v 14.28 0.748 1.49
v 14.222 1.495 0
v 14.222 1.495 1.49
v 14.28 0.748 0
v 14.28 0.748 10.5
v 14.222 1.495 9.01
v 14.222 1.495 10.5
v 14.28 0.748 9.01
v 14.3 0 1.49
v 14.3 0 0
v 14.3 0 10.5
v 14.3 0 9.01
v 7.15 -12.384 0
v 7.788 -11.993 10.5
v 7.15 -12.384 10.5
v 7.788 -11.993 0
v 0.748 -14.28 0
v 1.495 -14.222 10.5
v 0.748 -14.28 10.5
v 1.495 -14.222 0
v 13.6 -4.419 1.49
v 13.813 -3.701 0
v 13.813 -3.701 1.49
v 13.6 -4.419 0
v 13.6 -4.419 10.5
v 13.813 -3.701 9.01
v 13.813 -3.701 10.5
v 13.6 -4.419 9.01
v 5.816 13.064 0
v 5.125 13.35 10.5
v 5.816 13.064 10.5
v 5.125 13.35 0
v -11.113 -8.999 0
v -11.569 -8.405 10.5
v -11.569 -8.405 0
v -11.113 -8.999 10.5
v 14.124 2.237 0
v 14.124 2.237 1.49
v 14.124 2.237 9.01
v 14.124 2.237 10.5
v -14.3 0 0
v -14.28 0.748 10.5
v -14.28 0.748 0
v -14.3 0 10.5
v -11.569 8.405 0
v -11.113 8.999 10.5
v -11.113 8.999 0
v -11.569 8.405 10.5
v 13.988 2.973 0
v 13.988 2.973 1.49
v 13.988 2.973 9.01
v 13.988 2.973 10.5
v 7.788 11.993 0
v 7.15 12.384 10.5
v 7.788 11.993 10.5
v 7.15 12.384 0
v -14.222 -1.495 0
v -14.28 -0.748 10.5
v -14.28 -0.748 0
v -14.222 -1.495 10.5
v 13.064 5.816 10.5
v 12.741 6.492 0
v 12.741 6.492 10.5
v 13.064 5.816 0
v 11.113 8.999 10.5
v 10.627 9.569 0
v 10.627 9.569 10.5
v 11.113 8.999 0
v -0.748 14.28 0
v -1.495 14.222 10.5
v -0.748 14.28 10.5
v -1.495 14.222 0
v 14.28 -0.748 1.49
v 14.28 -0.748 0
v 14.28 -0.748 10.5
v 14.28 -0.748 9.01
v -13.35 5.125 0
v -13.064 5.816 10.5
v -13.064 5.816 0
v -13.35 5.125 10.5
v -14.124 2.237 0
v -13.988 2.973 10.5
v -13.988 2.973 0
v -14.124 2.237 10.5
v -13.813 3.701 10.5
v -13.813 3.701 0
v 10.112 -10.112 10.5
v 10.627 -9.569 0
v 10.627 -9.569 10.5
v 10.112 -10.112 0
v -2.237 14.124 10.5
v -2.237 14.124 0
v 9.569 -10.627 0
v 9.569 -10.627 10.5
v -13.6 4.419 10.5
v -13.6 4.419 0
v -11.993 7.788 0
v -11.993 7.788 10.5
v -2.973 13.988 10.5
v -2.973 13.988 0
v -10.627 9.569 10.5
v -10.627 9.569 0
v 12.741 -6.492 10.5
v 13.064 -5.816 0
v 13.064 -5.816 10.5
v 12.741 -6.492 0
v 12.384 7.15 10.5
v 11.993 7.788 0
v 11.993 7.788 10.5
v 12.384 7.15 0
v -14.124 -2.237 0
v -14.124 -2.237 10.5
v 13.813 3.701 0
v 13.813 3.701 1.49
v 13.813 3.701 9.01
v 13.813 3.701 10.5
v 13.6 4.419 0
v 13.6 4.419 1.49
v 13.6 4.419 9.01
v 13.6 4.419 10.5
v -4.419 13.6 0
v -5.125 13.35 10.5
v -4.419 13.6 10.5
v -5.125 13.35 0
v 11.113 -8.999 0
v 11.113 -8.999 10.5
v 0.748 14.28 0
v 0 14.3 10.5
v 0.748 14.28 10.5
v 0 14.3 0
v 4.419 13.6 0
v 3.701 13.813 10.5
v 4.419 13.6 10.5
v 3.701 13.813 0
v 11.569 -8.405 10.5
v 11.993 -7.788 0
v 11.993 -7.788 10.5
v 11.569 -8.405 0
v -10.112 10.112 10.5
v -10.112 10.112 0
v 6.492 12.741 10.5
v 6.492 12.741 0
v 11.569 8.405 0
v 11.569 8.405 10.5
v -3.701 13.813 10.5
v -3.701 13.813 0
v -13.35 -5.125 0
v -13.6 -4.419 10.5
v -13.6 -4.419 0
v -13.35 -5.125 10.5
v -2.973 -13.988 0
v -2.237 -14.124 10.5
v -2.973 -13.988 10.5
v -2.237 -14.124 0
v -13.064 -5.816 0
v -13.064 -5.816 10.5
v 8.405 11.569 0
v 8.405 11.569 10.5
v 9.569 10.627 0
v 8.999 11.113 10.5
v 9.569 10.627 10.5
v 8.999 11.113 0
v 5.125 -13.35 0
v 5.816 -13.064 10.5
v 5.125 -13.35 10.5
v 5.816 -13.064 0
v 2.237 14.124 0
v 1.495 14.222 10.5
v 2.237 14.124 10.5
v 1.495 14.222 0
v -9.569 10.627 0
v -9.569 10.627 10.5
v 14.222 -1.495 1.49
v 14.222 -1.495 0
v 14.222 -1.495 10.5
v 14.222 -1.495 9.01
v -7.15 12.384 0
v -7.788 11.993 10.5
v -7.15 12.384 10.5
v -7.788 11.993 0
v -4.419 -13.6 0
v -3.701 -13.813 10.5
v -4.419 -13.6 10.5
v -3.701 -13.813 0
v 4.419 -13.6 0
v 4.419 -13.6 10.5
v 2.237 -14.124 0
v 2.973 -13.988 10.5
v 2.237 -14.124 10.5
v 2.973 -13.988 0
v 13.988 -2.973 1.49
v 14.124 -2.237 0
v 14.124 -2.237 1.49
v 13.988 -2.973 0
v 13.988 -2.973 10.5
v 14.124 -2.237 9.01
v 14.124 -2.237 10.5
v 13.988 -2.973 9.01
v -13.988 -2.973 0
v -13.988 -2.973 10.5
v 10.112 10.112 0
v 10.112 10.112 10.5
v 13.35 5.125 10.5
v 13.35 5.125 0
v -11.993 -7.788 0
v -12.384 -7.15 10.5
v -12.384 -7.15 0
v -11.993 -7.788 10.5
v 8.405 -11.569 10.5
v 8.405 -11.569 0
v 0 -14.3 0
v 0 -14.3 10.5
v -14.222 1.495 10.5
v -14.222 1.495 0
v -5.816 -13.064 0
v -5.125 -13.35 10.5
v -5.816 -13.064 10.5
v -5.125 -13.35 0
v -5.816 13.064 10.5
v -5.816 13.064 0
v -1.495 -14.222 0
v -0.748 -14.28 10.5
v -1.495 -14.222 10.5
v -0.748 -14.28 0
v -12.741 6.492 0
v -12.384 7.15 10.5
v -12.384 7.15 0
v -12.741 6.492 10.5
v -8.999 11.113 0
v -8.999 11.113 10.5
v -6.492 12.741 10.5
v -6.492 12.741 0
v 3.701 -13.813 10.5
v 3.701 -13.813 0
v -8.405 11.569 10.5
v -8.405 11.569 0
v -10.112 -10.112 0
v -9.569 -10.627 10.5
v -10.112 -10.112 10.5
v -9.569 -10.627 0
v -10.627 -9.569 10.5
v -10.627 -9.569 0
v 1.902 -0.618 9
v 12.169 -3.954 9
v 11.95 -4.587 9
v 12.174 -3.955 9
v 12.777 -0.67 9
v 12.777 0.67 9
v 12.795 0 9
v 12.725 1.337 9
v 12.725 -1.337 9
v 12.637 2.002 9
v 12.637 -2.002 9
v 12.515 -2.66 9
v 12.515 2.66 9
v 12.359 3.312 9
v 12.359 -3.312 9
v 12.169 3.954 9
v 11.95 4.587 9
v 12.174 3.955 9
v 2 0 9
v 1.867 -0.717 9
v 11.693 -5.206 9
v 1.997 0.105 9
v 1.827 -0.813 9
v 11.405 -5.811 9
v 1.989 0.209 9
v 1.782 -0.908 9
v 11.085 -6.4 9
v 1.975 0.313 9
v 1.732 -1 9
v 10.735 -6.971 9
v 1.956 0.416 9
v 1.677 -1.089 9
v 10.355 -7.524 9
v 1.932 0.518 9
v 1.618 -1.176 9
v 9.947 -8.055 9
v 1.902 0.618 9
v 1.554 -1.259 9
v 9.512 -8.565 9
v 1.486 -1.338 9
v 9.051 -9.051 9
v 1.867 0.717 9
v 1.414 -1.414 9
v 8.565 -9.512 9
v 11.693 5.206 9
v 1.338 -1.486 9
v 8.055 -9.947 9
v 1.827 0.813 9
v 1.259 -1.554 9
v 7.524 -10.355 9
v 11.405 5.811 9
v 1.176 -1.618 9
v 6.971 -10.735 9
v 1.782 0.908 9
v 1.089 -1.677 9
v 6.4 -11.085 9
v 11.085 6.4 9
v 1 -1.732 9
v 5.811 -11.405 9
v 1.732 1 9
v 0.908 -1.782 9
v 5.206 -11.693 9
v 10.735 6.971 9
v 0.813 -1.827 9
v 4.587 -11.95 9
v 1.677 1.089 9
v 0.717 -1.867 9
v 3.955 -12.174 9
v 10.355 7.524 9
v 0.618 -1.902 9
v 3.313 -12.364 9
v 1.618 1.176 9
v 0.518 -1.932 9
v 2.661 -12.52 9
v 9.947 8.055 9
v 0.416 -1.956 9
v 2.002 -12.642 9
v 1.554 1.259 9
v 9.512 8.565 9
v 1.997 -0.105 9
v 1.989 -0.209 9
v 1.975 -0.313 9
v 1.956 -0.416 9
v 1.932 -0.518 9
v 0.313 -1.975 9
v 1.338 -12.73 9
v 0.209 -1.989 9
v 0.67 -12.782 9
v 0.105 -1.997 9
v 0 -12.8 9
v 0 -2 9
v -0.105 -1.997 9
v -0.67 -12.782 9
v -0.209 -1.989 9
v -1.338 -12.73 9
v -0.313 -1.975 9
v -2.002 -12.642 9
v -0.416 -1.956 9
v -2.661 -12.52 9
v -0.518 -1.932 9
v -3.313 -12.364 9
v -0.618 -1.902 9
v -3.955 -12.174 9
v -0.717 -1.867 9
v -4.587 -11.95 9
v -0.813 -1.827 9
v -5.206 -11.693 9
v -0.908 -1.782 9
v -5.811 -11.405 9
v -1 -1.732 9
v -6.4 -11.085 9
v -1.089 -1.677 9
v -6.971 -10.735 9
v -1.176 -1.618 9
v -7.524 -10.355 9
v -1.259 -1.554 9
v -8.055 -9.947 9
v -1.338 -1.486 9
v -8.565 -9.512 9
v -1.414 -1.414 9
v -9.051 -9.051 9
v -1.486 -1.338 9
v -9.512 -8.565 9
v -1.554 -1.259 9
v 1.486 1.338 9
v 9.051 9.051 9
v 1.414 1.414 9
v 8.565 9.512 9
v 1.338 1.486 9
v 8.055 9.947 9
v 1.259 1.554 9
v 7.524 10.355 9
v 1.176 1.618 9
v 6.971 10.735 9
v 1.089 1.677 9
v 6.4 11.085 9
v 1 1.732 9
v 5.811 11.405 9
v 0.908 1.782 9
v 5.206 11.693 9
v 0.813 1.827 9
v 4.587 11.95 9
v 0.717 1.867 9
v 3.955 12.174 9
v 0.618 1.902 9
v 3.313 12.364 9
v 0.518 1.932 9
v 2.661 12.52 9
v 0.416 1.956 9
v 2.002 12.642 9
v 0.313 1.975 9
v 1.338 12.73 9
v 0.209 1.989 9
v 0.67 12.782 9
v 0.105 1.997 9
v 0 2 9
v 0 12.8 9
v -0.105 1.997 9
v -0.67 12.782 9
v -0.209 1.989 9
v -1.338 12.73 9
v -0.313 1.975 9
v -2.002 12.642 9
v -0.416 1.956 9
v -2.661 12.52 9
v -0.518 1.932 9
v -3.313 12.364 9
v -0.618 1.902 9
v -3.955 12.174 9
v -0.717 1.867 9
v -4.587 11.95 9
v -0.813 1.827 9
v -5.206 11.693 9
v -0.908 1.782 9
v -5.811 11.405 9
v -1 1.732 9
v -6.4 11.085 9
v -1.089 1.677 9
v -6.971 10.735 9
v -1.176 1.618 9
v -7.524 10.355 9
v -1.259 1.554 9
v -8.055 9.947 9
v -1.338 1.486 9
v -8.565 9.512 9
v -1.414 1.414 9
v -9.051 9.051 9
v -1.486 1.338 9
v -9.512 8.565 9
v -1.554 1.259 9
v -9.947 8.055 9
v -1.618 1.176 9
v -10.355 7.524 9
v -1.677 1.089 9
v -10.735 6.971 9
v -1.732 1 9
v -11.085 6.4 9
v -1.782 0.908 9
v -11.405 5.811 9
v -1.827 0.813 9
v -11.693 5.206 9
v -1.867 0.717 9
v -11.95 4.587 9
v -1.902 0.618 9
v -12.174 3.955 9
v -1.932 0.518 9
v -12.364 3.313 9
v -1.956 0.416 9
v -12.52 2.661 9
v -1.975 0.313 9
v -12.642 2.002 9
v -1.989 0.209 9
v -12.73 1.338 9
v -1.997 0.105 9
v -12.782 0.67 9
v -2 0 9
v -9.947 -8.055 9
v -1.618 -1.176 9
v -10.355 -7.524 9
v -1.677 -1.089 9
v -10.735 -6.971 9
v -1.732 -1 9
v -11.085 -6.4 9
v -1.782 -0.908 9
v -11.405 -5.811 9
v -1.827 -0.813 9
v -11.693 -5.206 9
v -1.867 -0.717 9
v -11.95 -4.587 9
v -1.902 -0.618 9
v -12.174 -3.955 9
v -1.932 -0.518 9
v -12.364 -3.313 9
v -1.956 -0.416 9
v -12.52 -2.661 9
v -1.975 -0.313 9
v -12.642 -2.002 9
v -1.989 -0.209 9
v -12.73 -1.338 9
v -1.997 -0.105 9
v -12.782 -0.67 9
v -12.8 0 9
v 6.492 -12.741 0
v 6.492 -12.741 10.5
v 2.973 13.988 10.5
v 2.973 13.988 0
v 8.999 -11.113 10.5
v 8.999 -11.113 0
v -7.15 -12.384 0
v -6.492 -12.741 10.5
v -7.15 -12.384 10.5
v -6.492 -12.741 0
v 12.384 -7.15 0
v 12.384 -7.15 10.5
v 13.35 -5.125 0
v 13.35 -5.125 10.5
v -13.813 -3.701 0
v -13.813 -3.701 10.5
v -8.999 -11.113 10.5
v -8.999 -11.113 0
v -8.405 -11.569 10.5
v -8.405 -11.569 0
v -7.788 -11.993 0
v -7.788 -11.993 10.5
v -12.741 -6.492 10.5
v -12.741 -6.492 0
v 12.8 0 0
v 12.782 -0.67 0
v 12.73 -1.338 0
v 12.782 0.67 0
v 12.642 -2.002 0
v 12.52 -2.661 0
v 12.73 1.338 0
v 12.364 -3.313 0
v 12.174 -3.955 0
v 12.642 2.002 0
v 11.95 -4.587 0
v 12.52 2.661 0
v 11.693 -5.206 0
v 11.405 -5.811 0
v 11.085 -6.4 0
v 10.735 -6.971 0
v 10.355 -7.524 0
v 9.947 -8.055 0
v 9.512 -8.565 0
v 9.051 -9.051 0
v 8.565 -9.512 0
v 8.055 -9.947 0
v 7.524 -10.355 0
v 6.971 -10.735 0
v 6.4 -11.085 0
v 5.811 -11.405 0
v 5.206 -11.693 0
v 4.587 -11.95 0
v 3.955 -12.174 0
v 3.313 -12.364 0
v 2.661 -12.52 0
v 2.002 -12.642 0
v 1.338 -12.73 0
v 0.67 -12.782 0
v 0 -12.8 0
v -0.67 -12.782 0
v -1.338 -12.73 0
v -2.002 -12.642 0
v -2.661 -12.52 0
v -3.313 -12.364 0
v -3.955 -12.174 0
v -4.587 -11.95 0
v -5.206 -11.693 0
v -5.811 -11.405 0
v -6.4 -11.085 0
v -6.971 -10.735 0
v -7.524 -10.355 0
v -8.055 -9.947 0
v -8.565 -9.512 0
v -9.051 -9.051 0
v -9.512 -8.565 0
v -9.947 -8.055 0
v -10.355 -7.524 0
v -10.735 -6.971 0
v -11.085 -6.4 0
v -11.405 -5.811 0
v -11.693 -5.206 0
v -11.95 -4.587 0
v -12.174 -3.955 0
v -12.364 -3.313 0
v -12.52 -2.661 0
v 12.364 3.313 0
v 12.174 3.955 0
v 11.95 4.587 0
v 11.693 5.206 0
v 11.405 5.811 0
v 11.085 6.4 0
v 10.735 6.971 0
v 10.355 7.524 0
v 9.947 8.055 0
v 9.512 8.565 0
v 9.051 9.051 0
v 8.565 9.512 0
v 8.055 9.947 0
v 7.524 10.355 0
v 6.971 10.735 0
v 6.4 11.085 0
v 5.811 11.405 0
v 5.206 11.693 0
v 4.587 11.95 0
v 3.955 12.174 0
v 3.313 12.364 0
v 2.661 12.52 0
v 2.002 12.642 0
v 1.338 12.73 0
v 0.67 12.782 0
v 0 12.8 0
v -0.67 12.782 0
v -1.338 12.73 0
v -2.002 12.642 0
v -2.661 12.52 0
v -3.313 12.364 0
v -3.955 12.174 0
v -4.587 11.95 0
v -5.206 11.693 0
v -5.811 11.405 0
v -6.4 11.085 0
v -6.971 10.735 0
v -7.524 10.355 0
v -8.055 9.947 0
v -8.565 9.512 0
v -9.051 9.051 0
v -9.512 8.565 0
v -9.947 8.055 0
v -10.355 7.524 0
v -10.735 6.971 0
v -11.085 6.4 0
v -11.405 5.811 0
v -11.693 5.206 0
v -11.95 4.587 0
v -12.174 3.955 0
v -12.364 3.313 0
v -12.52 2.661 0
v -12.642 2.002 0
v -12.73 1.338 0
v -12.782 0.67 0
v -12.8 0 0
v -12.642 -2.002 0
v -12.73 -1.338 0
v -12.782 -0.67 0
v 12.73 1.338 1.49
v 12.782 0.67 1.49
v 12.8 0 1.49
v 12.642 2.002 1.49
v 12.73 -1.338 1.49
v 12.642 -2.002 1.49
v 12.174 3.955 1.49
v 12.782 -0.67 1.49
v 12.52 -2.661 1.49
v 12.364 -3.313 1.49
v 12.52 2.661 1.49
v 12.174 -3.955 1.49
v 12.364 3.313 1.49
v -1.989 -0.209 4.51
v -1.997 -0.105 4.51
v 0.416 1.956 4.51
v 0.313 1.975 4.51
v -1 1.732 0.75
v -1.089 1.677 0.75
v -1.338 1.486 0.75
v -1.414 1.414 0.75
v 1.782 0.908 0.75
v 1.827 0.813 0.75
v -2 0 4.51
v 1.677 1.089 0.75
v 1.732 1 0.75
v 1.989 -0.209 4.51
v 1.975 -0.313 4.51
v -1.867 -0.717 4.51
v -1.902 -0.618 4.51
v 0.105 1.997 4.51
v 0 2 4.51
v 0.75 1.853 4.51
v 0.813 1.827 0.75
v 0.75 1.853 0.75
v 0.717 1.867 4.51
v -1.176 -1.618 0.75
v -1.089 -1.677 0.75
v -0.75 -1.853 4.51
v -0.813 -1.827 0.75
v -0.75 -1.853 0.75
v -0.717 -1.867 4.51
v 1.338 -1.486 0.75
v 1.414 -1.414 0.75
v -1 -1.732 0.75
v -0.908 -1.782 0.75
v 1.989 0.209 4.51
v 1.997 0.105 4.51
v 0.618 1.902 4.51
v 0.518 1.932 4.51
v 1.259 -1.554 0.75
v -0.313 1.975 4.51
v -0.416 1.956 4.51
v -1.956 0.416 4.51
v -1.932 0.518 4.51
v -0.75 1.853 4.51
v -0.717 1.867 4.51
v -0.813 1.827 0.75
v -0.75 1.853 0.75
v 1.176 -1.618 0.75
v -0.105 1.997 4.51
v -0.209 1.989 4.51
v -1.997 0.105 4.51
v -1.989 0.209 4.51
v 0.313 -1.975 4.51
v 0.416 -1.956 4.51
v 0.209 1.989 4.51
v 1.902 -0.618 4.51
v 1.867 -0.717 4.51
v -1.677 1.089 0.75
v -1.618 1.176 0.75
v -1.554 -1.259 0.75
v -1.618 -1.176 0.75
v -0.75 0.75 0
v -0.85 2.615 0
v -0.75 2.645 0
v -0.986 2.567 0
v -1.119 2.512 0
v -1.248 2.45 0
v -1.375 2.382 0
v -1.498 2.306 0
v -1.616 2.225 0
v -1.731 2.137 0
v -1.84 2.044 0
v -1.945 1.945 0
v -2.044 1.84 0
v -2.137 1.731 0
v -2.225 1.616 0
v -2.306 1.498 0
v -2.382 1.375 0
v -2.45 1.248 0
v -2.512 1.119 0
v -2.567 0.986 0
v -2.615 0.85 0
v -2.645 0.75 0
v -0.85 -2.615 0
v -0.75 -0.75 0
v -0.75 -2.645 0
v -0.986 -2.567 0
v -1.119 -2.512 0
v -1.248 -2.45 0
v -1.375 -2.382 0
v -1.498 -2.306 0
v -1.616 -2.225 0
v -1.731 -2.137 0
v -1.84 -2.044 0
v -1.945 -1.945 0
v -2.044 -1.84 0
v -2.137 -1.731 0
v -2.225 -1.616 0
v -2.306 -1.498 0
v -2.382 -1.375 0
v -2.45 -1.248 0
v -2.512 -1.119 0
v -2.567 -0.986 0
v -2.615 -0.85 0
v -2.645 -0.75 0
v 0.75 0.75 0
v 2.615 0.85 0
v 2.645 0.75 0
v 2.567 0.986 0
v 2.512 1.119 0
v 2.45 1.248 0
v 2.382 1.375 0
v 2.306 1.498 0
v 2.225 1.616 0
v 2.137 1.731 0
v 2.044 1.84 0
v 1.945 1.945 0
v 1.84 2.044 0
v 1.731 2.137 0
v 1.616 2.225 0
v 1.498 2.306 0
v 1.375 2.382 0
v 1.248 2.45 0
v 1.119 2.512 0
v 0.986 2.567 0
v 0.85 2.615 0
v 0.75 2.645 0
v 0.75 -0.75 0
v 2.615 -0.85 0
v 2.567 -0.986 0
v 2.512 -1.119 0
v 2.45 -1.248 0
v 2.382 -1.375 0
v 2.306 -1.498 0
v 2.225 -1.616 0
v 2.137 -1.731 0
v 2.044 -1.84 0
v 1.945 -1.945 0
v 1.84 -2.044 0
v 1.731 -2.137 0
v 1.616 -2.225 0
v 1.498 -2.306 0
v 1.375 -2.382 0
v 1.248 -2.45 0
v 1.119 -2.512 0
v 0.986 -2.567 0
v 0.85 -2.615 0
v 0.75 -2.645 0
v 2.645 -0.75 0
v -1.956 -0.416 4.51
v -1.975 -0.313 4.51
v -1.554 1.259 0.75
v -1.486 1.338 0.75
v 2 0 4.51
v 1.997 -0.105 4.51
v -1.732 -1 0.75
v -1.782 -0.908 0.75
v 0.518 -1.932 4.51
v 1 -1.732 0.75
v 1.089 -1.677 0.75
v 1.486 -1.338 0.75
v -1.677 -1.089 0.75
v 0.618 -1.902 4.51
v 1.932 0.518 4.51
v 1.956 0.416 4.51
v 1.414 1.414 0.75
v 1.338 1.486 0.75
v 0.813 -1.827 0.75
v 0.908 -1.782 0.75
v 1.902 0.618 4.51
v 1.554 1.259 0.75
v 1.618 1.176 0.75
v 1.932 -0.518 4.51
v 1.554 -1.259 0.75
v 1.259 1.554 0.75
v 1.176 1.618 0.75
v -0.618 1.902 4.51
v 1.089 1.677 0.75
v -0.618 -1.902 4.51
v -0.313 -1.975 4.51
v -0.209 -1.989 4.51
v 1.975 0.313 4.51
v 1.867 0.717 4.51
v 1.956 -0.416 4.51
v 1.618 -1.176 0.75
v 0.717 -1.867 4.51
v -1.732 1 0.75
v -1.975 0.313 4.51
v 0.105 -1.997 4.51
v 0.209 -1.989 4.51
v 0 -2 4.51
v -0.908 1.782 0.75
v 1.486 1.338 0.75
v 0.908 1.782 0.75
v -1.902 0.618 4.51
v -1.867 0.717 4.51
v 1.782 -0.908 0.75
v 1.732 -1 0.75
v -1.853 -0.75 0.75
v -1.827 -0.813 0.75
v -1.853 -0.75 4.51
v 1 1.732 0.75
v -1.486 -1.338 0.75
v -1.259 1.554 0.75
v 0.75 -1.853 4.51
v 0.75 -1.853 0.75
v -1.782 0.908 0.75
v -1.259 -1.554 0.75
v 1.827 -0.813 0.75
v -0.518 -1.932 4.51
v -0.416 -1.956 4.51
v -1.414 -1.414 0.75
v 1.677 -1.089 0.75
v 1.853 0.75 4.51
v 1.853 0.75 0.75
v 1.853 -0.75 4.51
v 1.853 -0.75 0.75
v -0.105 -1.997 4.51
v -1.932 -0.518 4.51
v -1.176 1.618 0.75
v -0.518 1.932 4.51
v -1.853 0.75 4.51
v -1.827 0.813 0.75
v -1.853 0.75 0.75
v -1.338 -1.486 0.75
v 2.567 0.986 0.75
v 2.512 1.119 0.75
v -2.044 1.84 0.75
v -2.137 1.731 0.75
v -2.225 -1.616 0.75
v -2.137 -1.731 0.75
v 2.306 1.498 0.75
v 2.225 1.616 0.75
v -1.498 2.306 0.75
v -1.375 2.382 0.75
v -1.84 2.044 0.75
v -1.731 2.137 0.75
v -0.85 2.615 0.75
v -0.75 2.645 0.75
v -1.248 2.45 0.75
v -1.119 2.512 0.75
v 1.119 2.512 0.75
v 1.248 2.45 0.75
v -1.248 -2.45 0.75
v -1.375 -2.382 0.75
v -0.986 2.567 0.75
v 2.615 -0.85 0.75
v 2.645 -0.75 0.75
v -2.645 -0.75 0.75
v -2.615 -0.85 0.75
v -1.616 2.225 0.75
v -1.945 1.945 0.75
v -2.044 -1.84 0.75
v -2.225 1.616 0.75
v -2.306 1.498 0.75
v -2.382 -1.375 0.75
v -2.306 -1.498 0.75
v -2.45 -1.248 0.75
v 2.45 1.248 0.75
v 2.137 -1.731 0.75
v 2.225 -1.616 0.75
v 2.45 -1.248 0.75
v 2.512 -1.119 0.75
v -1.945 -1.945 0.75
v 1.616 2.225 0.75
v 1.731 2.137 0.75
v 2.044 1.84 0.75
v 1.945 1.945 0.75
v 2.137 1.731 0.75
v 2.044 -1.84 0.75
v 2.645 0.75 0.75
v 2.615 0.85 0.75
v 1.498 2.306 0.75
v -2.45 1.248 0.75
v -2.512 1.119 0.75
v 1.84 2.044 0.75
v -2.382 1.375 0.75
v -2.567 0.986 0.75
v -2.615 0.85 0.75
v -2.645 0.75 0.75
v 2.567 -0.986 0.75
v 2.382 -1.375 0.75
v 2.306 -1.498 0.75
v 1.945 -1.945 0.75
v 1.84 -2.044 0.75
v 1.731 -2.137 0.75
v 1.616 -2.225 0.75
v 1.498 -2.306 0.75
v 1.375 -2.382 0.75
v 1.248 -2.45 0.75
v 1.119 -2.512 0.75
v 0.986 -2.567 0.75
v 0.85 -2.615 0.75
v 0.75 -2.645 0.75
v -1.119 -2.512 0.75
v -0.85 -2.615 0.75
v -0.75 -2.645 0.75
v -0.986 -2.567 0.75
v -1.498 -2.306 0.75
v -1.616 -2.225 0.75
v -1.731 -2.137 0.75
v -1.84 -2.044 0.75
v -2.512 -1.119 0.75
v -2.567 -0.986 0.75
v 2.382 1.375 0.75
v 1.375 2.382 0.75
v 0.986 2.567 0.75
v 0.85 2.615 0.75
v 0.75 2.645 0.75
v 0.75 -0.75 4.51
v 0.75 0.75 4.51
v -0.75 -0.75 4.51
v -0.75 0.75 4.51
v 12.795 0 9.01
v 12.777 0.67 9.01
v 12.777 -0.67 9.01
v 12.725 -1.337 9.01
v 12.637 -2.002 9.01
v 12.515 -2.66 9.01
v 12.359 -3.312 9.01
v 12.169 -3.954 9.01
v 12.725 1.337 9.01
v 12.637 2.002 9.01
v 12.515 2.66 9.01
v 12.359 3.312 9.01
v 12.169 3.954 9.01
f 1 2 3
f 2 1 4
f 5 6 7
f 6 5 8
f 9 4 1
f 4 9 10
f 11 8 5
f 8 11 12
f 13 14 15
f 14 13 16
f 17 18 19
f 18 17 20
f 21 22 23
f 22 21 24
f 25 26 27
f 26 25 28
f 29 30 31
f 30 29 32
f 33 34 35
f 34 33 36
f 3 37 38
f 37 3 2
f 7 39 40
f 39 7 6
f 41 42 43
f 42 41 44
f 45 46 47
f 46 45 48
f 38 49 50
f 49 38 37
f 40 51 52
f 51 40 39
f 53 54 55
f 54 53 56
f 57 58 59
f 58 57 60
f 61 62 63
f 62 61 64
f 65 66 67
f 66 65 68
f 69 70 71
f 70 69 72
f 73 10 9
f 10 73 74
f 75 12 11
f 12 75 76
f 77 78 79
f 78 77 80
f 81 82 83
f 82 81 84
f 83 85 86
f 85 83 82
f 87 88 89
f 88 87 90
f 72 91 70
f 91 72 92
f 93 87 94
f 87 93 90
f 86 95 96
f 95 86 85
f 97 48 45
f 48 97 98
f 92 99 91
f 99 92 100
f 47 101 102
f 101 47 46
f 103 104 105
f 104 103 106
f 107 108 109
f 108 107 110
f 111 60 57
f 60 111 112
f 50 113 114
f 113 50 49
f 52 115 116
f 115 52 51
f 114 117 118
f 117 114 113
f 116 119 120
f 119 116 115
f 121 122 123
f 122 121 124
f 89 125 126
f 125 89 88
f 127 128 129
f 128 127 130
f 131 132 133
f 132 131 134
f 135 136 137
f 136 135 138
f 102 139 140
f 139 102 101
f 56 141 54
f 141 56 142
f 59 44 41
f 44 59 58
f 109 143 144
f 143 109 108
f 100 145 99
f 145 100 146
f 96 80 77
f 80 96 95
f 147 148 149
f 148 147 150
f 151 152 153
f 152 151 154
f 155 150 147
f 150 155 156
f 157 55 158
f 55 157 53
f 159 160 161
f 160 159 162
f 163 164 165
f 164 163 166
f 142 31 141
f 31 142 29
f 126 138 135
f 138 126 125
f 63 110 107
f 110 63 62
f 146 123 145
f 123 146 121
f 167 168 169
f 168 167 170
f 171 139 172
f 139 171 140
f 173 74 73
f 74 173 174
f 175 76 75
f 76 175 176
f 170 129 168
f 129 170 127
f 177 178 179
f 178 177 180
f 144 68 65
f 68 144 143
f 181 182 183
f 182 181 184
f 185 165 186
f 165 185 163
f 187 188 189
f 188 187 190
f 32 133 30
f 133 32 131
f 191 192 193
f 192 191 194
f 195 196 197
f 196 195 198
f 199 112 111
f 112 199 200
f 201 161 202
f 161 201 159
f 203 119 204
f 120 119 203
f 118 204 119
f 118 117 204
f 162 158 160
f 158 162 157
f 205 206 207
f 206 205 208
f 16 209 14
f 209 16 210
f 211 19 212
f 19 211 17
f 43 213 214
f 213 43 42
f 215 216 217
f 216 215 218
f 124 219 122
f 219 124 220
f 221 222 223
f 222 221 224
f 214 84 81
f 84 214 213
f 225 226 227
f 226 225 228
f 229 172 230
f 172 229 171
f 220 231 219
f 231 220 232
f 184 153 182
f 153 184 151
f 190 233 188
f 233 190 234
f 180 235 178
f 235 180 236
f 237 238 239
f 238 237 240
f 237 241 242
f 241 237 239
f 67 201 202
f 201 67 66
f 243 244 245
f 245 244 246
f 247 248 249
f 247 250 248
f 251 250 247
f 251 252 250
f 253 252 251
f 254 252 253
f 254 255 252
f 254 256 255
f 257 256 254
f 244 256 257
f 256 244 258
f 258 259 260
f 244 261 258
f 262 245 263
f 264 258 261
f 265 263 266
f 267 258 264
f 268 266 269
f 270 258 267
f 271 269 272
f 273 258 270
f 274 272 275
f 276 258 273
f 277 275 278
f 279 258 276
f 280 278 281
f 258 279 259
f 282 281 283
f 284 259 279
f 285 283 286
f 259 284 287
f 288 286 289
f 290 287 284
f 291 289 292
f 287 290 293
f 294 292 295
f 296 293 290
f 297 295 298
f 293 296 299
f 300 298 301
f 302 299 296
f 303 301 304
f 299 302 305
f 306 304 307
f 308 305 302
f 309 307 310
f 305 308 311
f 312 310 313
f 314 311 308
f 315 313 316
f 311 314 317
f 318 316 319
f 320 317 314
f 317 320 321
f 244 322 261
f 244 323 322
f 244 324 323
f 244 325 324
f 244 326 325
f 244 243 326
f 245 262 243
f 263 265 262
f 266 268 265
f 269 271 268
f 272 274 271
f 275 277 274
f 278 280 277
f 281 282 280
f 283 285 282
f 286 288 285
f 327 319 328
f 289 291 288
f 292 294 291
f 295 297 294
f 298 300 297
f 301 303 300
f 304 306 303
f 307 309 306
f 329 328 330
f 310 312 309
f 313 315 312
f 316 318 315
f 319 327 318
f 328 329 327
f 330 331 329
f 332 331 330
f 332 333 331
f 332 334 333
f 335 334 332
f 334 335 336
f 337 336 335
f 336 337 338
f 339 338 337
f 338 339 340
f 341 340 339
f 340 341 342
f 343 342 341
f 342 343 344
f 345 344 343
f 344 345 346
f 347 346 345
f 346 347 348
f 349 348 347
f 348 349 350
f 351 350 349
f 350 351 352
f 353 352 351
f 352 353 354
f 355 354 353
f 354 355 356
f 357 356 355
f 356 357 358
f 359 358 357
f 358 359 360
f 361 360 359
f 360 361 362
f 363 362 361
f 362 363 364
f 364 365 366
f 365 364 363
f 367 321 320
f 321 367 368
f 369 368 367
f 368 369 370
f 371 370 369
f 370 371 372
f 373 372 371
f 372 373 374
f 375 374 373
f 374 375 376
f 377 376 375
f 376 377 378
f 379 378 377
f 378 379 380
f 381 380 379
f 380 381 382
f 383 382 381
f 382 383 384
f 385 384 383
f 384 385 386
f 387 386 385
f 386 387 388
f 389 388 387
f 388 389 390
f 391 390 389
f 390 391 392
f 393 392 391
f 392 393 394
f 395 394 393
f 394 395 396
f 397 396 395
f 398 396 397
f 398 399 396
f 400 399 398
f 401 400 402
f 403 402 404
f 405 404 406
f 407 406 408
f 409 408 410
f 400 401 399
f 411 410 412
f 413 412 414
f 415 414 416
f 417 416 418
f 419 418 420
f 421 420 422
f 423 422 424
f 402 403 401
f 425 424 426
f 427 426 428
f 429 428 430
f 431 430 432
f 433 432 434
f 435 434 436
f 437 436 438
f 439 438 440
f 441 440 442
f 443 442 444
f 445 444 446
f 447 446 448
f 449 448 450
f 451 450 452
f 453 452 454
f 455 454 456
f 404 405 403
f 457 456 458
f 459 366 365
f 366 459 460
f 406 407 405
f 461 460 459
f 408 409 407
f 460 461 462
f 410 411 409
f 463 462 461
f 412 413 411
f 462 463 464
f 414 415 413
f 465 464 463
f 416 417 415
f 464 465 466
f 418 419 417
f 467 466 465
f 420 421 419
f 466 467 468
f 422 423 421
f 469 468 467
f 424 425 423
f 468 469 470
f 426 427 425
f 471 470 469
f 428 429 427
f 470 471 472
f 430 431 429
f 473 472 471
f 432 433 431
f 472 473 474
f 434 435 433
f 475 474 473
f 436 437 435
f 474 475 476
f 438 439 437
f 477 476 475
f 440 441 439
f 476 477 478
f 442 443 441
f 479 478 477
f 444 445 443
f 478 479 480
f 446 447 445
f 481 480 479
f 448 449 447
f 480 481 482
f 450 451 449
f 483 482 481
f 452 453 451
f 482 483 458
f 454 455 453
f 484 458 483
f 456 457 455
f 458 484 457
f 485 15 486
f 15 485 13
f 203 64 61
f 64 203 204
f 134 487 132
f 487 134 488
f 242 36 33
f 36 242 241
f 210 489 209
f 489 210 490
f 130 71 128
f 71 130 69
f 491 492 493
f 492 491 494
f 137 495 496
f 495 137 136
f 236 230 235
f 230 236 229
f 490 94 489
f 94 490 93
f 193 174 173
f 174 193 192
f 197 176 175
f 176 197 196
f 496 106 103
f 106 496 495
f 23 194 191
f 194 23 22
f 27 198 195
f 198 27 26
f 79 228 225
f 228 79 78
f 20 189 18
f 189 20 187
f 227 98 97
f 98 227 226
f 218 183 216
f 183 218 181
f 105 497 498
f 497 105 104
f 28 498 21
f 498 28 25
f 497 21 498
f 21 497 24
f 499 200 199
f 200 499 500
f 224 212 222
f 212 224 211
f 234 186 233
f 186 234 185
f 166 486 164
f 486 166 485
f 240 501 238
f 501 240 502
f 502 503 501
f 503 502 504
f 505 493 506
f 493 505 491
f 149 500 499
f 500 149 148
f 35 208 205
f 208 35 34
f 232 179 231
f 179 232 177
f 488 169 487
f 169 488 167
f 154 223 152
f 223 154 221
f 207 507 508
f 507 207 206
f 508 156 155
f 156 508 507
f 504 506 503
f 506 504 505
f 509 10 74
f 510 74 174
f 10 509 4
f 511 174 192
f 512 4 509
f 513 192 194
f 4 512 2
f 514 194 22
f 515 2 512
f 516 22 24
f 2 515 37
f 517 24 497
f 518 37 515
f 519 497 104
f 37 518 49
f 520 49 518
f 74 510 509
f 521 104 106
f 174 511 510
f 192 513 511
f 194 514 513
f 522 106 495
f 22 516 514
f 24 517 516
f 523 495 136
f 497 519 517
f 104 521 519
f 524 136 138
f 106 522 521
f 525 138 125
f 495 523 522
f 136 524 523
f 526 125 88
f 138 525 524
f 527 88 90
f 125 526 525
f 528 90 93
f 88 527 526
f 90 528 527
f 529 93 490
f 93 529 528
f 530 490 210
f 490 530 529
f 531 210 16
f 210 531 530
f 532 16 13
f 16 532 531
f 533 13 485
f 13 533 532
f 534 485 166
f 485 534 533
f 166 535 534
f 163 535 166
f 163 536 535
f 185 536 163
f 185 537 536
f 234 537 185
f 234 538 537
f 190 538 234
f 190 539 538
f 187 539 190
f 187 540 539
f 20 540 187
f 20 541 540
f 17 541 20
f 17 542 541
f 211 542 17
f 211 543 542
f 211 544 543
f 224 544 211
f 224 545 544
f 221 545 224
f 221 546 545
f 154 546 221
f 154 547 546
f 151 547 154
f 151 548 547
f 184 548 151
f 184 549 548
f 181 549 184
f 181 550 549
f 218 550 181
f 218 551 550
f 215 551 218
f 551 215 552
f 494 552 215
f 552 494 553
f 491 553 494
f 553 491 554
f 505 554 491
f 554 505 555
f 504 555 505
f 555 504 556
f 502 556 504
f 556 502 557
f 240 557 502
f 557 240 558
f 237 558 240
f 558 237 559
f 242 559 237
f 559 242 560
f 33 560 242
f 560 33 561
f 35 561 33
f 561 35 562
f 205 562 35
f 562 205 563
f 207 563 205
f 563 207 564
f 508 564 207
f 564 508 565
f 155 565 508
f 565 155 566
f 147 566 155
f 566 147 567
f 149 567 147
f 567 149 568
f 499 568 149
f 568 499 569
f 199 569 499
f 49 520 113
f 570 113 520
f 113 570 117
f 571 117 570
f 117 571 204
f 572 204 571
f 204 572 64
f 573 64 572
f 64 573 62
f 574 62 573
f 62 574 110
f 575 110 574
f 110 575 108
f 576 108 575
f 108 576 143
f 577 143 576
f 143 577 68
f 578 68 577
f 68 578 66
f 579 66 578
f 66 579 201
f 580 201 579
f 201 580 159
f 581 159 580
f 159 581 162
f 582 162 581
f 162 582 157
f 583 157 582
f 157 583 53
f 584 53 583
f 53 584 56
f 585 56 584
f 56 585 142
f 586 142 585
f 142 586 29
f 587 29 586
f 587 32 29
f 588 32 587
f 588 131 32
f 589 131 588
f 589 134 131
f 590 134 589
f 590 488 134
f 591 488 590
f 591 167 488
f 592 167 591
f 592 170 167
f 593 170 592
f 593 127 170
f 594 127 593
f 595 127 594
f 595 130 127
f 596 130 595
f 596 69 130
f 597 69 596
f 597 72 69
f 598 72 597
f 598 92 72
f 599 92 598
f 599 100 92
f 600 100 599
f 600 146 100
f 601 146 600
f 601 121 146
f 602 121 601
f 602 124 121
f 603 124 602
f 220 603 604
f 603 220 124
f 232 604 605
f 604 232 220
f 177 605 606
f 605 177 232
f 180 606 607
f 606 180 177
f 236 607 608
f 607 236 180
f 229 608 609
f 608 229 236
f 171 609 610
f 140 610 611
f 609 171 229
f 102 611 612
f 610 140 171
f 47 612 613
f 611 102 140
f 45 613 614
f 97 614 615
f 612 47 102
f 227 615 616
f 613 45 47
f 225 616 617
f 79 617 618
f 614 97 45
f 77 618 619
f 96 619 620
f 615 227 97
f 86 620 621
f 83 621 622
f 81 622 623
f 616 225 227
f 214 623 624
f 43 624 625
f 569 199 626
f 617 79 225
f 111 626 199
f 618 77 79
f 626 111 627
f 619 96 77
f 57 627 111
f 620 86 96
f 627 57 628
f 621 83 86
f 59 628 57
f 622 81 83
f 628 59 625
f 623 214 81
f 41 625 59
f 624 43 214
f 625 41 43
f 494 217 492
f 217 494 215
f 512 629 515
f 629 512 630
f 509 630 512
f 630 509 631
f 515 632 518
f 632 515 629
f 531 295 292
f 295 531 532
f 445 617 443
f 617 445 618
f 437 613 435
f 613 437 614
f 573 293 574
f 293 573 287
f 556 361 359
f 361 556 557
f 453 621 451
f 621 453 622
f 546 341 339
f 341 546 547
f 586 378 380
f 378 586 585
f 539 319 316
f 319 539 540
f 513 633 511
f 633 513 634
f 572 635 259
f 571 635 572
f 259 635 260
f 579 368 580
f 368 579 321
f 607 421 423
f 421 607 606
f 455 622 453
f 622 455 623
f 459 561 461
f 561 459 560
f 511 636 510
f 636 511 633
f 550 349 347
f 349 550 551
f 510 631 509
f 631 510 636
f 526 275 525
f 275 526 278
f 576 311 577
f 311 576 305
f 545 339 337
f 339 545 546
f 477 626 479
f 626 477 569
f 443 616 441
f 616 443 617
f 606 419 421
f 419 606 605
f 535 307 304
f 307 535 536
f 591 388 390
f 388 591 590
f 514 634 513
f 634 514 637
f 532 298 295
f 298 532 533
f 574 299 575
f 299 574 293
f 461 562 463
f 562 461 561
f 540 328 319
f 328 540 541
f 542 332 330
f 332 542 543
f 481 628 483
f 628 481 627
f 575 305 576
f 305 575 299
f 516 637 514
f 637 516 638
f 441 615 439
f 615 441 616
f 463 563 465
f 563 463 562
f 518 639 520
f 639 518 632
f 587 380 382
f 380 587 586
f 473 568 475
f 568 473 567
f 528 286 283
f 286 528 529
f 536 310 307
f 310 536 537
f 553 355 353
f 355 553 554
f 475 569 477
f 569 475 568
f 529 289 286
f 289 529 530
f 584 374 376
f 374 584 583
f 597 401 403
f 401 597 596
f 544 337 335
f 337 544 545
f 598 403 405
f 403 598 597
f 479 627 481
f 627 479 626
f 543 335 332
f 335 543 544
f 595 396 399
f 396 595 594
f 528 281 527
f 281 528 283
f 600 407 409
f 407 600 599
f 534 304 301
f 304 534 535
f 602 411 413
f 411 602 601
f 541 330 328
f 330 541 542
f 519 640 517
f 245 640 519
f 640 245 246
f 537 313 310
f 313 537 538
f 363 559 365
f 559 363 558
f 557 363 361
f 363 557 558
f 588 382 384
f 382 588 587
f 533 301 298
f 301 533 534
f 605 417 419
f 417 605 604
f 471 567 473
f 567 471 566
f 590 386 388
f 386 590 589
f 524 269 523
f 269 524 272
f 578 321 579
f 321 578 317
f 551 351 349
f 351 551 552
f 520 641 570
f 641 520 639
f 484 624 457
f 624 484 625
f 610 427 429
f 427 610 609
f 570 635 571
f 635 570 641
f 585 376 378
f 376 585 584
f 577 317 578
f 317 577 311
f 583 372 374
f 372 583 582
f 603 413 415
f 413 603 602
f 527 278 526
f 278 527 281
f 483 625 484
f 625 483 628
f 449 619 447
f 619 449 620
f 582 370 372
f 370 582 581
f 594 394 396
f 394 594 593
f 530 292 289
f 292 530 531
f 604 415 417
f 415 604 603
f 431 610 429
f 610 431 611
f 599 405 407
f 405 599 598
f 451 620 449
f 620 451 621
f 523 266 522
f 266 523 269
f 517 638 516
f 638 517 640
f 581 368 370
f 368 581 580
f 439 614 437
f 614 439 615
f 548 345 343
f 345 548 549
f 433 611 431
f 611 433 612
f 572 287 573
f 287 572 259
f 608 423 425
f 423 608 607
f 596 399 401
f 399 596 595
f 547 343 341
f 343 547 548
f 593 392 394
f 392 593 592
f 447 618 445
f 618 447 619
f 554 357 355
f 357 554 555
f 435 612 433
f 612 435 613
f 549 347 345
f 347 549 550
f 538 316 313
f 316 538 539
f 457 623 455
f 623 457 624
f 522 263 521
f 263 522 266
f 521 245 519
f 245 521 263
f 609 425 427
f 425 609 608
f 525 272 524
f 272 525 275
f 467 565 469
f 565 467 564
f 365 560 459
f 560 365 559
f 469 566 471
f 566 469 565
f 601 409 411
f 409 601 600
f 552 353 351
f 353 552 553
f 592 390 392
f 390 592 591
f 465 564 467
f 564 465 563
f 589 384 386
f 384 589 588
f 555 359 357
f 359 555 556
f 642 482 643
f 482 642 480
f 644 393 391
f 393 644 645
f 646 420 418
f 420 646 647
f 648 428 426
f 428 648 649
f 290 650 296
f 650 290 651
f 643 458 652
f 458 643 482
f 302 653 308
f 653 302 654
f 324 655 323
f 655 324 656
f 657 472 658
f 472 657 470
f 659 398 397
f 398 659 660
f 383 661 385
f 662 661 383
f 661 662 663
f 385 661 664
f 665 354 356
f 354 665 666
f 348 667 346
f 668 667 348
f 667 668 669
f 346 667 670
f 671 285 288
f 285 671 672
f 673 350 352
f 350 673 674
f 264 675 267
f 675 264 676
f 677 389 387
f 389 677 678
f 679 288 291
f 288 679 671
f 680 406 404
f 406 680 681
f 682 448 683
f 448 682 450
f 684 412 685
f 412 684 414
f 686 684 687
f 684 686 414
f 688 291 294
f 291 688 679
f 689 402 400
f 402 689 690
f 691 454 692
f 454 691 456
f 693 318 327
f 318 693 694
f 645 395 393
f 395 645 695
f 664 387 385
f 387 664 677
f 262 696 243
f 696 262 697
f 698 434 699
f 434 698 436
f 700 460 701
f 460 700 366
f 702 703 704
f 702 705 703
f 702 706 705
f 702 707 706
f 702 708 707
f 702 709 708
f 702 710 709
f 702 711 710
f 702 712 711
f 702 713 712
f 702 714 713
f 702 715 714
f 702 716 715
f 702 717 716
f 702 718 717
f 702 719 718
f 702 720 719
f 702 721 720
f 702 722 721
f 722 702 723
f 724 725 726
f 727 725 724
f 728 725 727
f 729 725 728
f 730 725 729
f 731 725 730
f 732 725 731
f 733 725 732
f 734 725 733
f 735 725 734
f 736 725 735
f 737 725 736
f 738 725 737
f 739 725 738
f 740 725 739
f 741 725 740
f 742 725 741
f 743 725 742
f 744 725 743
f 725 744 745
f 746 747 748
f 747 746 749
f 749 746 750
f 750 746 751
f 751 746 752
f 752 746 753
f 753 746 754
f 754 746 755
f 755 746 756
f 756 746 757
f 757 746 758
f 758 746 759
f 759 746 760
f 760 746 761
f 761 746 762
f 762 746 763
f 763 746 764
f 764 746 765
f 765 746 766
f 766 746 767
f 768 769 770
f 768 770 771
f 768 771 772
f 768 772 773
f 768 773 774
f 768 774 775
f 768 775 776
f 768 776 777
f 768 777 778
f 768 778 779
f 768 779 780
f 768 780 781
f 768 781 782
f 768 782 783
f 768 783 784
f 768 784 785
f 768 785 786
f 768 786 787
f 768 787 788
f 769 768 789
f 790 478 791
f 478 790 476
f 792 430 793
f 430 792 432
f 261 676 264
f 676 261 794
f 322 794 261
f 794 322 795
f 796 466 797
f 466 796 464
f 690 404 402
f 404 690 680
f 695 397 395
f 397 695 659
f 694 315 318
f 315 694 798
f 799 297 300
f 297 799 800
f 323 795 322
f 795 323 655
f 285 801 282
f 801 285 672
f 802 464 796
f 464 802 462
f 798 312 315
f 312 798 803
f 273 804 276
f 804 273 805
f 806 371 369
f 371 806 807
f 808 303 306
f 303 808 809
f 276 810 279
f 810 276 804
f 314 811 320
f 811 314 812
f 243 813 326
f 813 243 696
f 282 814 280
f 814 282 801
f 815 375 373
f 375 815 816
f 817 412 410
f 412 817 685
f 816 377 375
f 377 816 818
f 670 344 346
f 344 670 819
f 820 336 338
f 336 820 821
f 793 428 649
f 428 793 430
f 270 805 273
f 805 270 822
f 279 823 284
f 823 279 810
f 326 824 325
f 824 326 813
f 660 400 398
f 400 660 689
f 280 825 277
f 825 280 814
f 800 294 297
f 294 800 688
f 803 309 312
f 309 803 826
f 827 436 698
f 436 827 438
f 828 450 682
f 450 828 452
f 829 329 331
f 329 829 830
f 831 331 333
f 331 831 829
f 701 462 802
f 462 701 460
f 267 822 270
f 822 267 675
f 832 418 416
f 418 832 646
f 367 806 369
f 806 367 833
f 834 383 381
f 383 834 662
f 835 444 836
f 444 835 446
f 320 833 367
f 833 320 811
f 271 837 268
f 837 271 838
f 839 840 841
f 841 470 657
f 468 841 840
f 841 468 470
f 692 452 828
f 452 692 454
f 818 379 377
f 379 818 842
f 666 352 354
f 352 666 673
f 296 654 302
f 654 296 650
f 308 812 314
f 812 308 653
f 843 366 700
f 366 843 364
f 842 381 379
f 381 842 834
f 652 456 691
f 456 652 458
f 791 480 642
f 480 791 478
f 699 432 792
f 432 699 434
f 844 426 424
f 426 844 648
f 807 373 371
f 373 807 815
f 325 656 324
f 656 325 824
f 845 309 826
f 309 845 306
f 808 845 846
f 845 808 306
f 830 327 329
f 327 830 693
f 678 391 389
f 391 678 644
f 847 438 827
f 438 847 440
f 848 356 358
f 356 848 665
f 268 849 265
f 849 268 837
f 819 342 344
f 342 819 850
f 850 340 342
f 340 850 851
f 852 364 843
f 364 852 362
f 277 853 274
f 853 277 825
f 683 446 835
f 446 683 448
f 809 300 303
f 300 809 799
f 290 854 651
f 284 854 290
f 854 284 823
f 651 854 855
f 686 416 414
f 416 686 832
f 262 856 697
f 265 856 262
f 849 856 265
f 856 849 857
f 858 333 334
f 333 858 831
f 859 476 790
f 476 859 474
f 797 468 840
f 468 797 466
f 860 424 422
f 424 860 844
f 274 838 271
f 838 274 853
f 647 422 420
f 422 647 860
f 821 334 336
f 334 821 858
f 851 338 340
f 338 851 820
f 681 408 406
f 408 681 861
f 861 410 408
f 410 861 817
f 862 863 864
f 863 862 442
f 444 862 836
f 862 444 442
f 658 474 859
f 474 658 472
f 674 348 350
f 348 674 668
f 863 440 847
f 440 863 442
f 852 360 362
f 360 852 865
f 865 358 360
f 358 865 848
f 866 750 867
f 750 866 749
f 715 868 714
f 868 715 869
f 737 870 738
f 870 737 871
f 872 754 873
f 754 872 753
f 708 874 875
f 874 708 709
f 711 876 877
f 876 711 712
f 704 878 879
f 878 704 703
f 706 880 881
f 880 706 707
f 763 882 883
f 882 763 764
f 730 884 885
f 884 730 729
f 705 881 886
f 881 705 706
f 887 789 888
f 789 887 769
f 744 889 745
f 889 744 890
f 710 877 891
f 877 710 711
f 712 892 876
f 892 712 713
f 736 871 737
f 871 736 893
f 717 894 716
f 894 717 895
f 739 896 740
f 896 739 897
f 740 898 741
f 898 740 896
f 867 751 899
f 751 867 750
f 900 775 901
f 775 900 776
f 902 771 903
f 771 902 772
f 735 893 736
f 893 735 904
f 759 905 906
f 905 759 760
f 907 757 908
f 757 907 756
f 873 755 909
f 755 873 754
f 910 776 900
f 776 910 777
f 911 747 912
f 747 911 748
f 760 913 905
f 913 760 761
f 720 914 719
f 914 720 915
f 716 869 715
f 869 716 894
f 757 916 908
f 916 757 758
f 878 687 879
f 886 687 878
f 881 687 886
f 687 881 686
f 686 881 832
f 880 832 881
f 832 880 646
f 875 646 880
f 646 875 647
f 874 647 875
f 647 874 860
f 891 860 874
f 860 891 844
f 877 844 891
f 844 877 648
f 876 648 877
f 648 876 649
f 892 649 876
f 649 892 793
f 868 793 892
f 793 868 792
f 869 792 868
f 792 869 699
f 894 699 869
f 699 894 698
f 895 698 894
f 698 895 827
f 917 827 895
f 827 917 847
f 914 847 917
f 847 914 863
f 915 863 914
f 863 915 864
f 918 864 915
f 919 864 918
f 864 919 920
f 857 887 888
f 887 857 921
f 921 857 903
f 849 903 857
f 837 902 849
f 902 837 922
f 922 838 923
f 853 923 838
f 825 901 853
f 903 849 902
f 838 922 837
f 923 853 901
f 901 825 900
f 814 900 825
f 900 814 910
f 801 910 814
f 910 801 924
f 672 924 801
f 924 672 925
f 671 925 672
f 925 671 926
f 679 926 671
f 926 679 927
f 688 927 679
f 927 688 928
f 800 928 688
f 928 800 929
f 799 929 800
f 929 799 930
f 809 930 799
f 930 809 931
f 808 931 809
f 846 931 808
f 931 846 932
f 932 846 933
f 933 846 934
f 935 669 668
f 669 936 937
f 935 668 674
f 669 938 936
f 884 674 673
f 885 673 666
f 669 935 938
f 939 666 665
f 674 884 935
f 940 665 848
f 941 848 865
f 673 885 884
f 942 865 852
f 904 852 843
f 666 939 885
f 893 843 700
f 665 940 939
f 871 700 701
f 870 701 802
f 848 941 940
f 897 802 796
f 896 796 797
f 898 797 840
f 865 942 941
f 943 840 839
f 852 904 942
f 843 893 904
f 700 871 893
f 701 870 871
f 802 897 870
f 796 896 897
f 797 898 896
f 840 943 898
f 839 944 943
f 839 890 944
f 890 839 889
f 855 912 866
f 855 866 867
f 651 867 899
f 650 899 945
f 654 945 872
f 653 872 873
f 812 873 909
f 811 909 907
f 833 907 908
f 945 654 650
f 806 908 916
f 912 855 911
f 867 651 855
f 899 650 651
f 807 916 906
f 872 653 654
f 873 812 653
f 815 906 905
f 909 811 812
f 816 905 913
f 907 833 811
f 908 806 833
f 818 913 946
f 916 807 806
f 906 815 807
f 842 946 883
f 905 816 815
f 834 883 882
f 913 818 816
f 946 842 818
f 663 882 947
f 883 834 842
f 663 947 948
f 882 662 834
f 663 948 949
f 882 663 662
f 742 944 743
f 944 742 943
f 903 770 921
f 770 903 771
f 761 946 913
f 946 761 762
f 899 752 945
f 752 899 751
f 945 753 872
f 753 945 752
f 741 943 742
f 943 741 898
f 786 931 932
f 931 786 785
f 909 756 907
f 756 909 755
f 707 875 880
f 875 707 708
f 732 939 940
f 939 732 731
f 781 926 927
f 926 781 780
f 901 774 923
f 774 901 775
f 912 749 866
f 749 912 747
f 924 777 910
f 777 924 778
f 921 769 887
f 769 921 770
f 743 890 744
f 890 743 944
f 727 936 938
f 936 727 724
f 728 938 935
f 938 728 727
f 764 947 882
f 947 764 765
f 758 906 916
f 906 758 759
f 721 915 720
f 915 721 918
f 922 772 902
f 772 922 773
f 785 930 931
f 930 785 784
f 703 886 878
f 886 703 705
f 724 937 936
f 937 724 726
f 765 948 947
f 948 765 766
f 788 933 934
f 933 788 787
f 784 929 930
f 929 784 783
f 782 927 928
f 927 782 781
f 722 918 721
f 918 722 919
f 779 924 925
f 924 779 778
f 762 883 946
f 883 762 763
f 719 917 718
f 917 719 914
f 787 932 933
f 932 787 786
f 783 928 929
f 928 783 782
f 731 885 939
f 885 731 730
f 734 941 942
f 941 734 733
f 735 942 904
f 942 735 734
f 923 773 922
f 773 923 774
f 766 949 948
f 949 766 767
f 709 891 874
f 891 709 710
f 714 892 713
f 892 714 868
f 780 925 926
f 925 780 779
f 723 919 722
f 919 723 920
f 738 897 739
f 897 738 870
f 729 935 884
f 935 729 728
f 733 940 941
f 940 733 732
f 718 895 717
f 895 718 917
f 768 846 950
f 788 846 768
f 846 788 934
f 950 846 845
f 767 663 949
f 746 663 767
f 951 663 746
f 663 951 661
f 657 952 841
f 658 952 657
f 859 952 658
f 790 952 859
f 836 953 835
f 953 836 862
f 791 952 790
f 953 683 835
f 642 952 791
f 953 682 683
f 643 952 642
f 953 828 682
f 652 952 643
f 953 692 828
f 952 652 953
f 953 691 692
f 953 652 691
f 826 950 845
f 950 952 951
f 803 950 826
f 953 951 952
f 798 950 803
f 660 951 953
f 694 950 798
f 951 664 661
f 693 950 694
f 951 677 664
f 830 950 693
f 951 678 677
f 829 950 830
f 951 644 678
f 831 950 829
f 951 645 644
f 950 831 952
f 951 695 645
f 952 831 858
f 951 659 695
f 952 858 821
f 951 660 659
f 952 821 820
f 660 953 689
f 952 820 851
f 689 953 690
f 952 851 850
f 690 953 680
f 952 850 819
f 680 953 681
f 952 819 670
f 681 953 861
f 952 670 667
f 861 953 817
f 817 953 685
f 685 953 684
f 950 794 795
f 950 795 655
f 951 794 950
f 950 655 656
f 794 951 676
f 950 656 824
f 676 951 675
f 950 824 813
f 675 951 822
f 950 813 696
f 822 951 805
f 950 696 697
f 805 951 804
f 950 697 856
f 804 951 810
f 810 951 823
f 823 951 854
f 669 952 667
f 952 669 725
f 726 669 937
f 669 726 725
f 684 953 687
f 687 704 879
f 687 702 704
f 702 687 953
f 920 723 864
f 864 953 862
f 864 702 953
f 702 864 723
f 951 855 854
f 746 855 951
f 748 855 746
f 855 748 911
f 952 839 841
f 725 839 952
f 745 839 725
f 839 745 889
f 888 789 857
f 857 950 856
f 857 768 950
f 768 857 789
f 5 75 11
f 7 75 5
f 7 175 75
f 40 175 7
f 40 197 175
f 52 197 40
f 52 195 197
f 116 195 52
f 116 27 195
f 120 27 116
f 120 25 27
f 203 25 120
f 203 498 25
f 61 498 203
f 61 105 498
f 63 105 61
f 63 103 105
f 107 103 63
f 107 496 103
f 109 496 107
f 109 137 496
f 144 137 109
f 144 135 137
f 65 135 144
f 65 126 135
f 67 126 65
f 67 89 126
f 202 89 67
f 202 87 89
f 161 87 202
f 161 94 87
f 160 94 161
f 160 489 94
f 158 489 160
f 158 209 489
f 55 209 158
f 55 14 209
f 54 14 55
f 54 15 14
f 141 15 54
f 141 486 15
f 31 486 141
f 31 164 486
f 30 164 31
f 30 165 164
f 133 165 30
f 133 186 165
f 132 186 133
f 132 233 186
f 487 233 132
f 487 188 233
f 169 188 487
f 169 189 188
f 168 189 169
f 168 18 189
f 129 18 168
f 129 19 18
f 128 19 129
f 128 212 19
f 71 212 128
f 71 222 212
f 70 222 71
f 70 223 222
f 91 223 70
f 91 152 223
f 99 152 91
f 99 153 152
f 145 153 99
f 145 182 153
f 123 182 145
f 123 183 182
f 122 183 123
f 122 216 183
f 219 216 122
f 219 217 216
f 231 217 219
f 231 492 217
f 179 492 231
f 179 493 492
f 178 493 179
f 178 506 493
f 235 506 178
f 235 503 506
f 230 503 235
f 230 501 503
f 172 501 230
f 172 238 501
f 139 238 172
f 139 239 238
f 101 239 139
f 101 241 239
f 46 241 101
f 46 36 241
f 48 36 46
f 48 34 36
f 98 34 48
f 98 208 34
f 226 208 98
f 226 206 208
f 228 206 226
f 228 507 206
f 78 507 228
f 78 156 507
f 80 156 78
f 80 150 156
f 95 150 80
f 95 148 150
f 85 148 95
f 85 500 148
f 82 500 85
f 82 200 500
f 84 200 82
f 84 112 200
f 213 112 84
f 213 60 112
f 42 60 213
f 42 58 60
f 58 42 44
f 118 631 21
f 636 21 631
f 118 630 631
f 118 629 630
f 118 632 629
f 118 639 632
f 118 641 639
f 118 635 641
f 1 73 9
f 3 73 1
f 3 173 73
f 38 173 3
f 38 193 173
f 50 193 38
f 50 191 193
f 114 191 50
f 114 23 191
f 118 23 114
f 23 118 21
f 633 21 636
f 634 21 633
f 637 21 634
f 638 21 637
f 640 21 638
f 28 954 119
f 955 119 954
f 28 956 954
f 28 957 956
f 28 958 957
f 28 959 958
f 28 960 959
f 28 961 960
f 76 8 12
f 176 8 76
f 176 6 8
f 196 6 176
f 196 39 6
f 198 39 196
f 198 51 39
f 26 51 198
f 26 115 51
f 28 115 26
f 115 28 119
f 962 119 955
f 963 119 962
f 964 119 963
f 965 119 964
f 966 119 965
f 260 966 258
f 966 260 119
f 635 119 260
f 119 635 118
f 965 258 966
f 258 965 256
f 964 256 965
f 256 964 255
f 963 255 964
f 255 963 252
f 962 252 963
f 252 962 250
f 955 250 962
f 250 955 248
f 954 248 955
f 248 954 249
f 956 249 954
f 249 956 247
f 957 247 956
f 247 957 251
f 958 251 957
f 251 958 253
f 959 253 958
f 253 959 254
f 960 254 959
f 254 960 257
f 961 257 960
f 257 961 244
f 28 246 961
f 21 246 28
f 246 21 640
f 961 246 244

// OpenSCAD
// ============================================================
//  Cover for Counter Cylinder
//  Hollow cylinder with viewing window, rod, and optional rounded top
// ============================================================

// ── Parameters (edit here) ──────────────────────────────────
cylinder_diameter = 25;    // base cylinder diameter [mm]
gap              = 0.3;    // gap between cover and inner cylinder [mm]
thickness        = 1.5;    // wall thickness [mm]
number_of_digits = 2;      // number of digit layers
digit_height     = 3;      // height per digit layer [mm]
rod_diameter     = 4;      // central rod diameter [mm]
$fn              = 120;    // curve resolution (higher = smoother)

// Snap
snap_size   = 1.5;      // snap fit size [mm]
snap_height = 0.75;    // snap fit size [mm]
snap_gap   =  1.5;      // snap fit size [mm]


// ── Derived values ──────────────────────────────────────────
inner_diameter  = cylinder_diameter + 2 * gap;
outer_diameter  = inner_diameter + 2 * thickness;
cover_height    = number_of_digits * digit_height + thickness * 2;
rod_height      = cover_height;
window_angle    = 36;  // 360/10 = 36° for 1/10th opening

// ── Model ───────────────────────────────────────────────────
difference() {
    // Main cover body
    union() {
        // Outer cylinder (flat top)
        translate([0, 0, cover_height ])          cylinder(h = thickness, d = outer_diameter, center = false);
        // Hollow cylinder
        difference() {
            cylinder(h = cover_height, d = outer_diameter, center = false);      
            // Inner hollow space
            translate([0, 0, -0.01])  // slight overlap to avoid z-fighting
            cylinder(h = cover_height + 0.02, d = inner_diameter, center = false);
        }
        
        // Snap clip at rod bottom
        difference() {
            union() {
                // Central rod
                cylinder(h = rod_height, d = rod_diameter, center = false);
                // Snap top
                cylinder(h = snap_height, d = rod_diameter + snap_size, center = false); 
            }
            union() {
                // Split into two parts with gap
                translate([-snap_gap/2, -(rod_diameter + snap_size + snap_gap)/2, -0.01])
                    cube([snap_gap, rod_diameter + snap_size + snap_gap + 0.02, snap_gap + digit_height + 0.02], center = false);
                rotate([0,0,90])
                translate([-snap_gap/2, -(rod_diameter + snap_size + snap_gap)/2, -0.01])
                    cube([snap_gap, rod_diameter + snap_size + snap_gap + 0.02, snap_gap + digit_height + 0.02], center = false);
            }
        }
        
    }
    
    // Viewing window (sector centered on cylinder, avoiding rod)
    rotate([0, 0, -window_angle/2])  // center the window
    translate([0, 0, thickness -0.01])  // slight overlap to avoid z-fighting
    linear_extrude(height = cover_height - thickness + 0.02)
    difference() {
        // Outer sector
        polygon([
            [0, 0],
            [outer_diameter * cos(window_angle), outer_diameter * sin(window_angle)],
            [outer_diameter, 0]
        ]);
        // Inner circle to avoid rod
        circle(d = inner_diameter - 0.01); 
    }
}
